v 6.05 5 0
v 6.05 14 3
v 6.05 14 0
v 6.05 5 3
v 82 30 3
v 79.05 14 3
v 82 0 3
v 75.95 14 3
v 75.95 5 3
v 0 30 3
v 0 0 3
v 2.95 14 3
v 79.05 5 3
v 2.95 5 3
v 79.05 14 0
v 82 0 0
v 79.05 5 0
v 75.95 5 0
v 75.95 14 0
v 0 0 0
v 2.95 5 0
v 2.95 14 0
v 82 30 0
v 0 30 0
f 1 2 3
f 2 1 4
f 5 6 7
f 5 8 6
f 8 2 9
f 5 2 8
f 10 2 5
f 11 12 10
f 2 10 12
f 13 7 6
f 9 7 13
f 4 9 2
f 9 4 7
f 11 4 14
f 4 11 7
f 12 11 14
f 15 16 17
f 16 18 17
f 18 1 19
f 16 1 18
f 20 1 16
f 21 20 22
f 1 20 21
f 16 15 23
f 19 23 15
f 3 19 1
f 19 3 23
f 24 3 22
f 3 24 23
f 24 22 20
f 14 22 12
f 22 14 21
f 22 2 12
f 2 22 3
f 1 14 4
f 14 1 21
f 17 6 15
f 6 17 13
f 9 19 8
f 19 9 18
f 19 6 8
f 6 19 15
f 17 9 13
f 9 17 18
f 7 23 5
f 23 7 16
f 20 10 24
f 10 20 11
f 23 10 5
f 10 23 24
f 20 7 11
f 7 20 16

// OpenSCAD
lct=3;//laser cut thickness
hole_tolerance=.05;
dim_x = 76+lct+lct;
dim_y = 30;// 20 previously, then 46
solid_below_hole = 5;
hole_length = 9;

difference(){
    //cuboid
    cube([dim_x,dim_y,lct]);
    //screw holes
    for(x=[lct-hole_tolerance, dim_x-(lct*2)-hole_tolerance]) translate([x,solid_below_hole,0]) color("red") cube([lct+2*hole_tolerance,hole_length,lct]);
}
